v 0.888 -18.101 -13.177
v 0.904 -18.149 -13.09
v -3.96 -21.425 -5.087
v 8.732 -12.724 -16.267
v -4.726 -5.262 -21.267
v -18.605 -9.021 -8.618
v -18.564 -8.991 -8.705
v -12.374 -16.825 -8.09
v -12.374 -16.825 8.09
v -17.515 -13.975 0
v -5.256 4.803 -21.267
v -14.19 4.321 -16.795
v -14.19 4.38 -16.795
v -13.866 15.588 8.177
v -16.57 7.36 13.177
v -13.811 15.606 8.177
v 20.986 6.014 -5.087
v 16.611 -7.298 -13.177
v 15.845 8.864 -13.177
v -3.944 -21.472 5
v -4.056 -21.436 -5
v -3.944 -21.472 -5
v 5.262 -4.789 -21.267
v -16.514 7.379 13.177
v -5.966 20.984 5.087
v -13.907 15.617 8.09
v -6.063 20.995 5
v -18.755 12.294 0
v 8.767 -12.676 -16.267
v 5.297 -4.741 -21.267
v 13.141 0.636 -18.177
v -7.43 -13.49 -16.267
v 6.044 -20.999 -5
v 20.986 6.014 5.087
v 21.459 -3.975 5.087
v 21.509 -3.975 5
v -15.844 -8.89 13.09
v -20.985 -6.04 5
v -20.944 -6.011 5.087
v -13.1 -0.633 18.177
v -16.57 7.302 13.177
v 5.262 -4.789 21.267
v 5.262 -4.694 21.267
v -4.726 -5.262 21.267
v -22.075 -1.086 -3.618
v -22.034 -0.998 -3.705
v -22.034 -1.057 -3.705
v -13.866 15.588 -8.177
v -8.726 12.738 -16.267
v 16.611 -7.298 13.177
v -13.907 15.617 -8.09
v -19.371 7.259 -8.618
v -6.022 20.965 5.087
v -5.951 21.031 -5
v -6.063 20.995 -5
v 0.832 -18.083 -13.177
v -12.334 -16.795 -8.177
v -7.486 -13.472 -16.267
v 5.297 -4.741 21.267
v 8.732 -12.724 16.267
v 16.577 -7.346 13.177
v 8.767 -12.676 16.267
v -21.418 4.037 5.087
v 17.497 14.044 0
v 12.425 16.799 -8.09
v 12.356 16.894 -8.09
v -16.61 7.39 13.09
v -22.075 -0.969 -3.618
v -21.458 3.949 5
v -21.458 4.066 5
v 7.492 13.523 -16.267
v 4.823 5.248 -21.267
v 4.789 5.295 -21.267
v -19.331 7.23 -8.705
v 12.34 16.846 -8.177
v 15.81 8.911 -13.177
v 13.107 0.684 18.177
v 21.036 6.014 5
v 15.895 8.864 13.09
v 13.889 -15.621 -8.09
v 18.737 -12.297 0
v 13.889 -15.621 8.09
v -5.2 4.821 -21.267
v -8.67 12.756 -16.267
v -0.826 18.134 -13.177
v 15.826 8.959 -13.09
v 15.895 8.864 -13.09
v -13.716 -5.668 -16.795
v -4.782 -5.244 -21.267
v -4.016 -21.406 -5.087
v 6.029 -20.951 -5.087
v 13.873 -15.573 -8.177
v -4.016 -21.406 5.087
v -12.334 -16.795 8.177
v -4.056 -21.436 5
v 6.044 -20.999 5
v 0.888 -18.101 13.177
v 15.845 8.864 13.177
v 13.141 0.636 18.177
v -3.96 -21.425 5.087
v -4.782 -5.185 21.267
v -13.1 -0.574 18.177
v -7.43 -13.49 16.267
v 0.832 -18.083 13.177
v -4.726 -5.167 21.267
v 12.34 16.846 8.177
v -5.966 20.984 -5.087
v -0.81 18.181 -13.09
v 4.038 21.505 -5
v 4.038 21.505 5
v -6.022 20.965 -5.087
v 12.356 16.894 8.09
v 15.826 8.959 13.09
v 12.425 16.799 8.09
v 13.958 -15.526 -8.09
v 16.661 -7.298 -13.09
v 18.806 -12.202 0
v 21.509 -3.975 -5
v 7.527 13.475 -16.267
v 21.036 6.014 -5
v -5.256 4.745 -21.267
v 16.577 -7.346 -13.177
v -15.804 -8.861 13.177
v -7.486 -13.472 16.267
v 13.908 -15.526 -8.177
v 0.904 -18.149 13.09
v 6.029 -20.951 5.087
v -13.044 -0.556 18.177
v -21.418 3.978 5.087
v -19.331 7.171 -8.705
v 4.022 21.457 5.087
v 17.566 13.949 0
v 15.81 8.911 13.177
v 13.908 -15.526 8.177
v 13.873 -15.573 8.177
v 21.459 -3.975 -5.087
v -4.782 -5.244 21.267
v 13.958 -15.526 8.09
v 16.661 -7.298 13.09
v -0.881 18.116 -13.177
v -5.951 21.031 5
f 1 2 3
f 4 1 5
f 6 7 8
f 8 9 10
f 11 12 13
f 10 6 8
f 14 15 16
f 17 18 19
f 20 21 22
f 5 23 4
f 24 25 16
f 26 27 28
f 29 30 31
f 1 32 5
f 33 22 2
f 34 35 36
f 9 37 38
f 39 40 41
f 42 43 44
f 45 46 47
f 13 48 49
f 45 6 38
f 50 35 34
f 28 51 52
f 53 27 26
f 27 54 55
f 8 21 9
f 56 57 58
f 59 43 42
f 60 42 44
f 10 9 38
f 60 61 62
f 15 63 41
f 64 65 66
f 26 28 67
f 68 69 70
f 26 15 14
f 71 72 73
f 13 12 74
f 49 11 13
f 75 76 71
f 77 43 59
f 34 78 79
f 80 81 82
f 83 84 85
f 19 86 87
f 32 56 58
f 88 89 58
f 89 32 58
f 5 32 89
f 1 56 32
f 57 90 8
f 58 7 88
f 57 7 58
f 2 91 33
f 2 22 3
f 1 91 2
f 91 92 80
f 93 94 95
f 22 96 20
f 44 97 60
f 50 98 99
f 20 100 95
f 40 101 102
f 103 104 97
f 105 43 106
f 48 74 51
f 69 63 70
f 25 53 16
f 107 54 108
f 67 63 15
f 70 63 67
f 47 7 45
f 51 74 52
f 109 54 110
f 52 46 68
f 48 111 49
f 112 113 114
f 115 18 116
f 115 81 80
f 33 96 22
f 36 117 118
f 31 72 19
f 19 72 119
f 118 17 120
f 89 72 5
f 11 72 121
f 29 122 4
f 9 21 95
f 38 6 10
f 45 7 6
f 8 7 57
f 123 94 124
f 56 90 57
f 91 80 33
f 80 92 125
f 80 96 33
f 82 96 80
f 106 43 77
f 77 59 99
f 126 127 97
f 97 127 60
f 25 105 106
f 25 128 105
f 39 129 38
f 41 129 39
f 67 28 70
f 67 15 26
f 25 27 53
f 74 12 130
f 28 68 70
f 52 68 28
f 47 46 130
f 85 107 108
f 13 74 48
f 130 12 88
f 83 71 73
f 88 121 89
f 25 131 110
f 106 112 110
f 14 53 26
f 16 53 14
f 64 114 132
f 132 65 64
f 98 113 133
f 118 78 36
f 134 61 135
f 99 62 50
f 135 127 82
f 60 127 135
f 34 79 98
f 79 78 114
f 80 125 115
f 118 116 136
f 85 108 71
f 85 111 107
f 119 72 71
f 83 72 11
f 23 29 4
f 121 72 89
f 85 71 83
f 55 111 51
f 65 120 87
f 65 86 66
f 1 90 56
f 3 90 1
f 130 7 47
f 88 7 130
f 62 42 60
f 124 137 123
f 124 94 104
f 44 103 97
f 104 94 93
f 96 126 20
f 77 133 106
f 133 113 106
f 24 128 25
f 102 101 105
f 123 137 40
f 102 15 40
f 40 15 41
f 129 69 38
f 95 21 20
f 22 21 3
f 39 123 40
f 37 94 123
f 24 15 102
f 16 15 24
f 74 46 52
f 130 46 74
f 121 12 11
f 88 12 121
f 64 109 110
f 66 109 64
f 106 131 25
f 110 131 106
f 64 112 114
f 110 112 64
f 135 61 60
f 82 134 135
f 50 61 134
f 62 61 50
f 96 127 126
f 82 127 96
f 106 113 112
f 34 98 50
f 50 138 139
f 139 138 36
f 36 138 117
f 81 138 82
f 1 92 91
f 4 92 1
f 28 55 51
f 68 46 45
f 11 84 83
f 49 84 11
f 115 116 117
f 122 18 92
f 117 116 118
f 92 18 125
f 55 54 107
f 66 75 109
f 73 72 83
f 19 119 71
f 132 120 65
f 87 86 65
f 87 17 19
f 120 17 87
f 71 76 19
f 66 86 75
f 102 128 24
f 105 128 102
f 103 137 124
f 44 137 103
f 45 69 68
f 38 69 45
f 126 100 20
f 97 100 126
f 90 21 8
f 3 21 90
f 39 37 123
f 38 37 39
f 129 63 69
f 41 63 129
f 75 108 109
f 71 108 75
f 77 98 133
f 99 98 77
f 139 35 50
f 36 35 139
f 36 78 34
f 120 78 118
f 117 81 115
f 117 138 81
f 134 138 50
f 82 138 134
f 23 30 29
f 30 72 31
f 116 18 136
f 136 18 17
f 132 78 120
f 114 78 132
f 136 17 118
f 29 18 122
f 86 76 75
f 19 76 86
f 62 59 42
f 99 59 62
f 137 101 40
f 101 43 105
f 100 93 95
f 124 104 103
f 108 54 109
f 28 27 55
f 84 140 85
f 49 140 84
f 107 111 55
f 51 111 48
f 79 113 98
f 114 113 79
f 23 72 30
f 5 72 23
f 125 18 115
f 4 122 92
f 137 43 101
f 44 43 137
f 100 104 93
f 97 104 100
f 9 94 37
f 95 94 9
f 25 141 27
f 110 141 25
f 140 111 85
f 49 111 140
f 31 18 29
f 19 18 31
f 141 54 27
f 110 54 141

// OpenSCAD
// Auto-generated OpenSCAD file

    inner_points = 10*[[-1.652954838618672, 0.7331031267239583, 1.309016994374885], [1.8705714695316353, -1.2202296084263586, 9.520162436160717e-14], [-2.1377569026756937, 0.40075020963339975, 0.49999999999995376], [1.3857694054746135, -1.5525825255169172, -0.8090169943748362], [-1.3826041813849252, 1.5558488481550894, 0.8090169943748362], [2.140922126765382, -0.3974838869952276, -0.49999999999995376], [-1.867406245441947, 1.2234959310645308, -9.520162436160717e-14], [1.6561200627083603, -0.7298368040857861, -1.309016994374885], [-0.7445241014447653, -1.3442341281397892, 1.618033988749972], [0.08726762778757838, -1.8053534363108568, 1.3090169943750618], [-1.2293261655017869, -1.6765870452303477, 0.8090169943750405], [-0.3975344362694432, -2.1377063534014153, 0.5000000000001303], [0.4006996603591313, 2.1409726760395875, -0.5000000000001303], [1.232491389591475, 1.67985336786852, -0.8090169943750405], [-0.08410240369789032, 1.808619758949029, -1.3090169943750618], [0.7476893255344533, 1.3475004507779613, -1.618033988749972], [1.3091303975330184, 0.0636354211759657, 1.8090169943749566], [-2.199388481084053, -0.10273410018217301, -0.36180339887500484], [-0.7445241014447332, -1.3442341281399923, -1.6180339887498179], [1.579481054766765, 0.8863811426070967, 1.3090169943749077], [-1.929037823850306, 0.7200116212489581, -0.8618033988750537], [-0.47417344421098645, -0.5214884067088612, -2.118033988749867], [2.140922126765372, -0.3974838869951649, 0.5000000000000463], [-1.3675967518516992, -0.5638534083533033, -1.670820393249915], [0.8716938452479853, -1.2675951201984228, -1.6180339887498065], [-1.5763158306771028, -0.8831148199687601, 1.3090169943749874], [0.6013431880142225, -2.0903408416294527, 0.5000000000001372], [-0.5981779639245345, 2.093607164267625, -0.5000000000001372], [1.579481054766791, 0.8863811426069322, -1.3090169943749874], [0.5247041800726373, -0.4741228949366325, 2.11803398874993], [-1.2293261655017709, -1.6765870452304492, -0.8090169943748543], [1.232491389591459, 1.6798533678686214, 0.8090169943748543], [-0.5215389559829493, 0.4773892175748047, -2.11803398874993], [-1.305965173443366, -0.060369098537566515, 1.8090169943749381], [1.3857694054745975, -1.5525825255168155, 0.8090169943750587], [-2.090391390903731, -0.5981274146502662, 0.5000000000000169], [0.6013431880142324, -2.0903408416295153, -0.49999999999986267], [-0.5981779639245444, 2.0936071642676874, 0.49999999999986267], [2.0935566149934193, 0.6013937372884384, -0.5000000000000169], [-1.3826041813849093, 1.5558488481549877, -0.8090169943750587], [1.3091303975330542, 0.06363542117573866, -1.8090169943749381], [-0.4741734442110284, -0.5214884067085954, 2.1180339887499233], [0.8716938452479531, -1.26759512019822, 1.6180339887499833], [-1.743401725728415, -1.3915996399118535, 7.027711745877241e-14], [-0.39753443626943324, -2.137706353401478, -0.49999999999986966], [0.40069966035912136, 2.14097267603965, 0.49999999999986966], [1.7465669498181031, 1.3948659625500257, -7.027711745877241e-14], [-0.8685286211582651, 1.2708614428363922, -1.6180339887499833], [0.47733866830071653, 0.5247547293467676, -2.1180339887499233], [1.6561200627083341, -0.7298368040856218, 1.3090169943750098], [-1.8523988159087368, -0.8962063254437607, -0.8618033988749515], [0.08726762778760436, -1.8053534363110213, -1.3090169943748333], [2.093556614993409, 0.601393737288501, 0.4999999999999831], [-1.4149622636236618, 0.43502421593036245, -1.6708203932499783], [0.5247041800726793, -0.47412289493689824, -2.11803398874986]];

    outer_points = 10*[[0.4513288900262728, -0.2057852874430356, 2.1771593019343873], [-1.302649108448602, -0.7848281063879728, -1.6349978963843712], [0.3941935542206573, 0.7848281063879728, 2.052979362471562], [-1.3597844442542175, 0.2057852874430356, -1.7591778358471963], [1.3597844442542175, -0.2057852874430356, 1.7591778358471963], [-0.3941935542206573, -0.7848281063879728, -2.052979362471562], [1.302649108448602, 0.7848281063879728, 1.6349978963843712], [-0.4513288900262728, 0.2057852874430356, -2.1771593019343873], [-1.688543053881056, -0.4269599633384501, 1.3973530414307818], [-2.102601092560149, -0.5636534304925583, 0.4974248017124077], [-1.7456783896866714, 0.5636534304925583, 1.273173101967957], [-2.1597364283657643, 0.4269599633384501, 0.373244862249583], [2.1597364283657643, -0.4269599633384501, -0.373244862249583], [1.7456783896866714, -0.5636534304925583, -1.273173101967957], [2.102601092560149, 0.5636534304925583, -0.4974248017124077], [1.688543053881056, 0.4269599633384501, -1.3973530414307818], [-0.5402422132585865, -2.1664995714220154, 0.022043945687575728], [0.15791777208586583, 1.609728484671791, 1.5394493042628863], [-0.7822713796484513, 2.029806104267907, -0.5039907193187587], [0.3682133409693583, -2.1664995714220154, -0.3959375203996154], [1.0663733263138107, 1.609728484671791, 1.121467838175695], [0.1261841745794935, 2.029806104267907, -0.9219721854059499], [-0.6742469030791683, -1.544010572482048, -1.4654318282511805], [0.02391308226528406, 2.232217483611758, 0.051973530324130296], [-0.8238291541769085, 1.0494489622784173, -1.79053913048576], [-1.1014025269441718, 0.17893407152476137, 1.9341569349947676], [-2.185420545521156, -0.17893407152476137, -0.4218857840237987], [2.185420545521156, 0.17893407152476137, 0.4218857840237987], [1.1014025269441718, -0.17893407152476137, -1.9341569349947676], [-1.0858249656670136, -1.792036464295737, 0.7717884632905911], [-1.292542552570369, 1.792036464295737, 0.32250122159318684], [1.292542552570369, -1.792036464295737, -0.32250122159318684], [1.0858249656670136, 1.792036464295737, -0.7717884632905911], [-0.47300032157473804, -0.5802483945693141, 2.103723003127959], [-1.81292028137052, -1.0225977463601432, -0.8085059554724263], [-0.5654472368668626, 1.0225977463601432, 1.9027956403562043], [-1.9053671966626446, 0.5802483945693141, -1.0094333182441808], [1.9053671966626446, -0.5802483945693141, 1.0094333182441808], [0.5654472368668626, -1.0225977463601432, -1.9027956403562043], [1.81292028137052, 1.0225977463601432, 0.8085059554724263], [0.47300032157473804, 0.5802483945693141, -2.103723003127959], [-1.0601408485116224, -1.1861424294325253, 1.566919109563973], [-1.7301008284095134, -1.40731710532794, 0.11080463026378029], [-1.2097230996093626, 1.40731710532794, 1.2418118073293933], [-1.8796830795072537, 1.1861424294325253, -0.21430267197079933], [1.8796830795072537, -1.1861424294325253, 0.21430267197079933], [1.2097230996093626, -1.40731710532794, -1.2418118073293933], [1.7301008284095134, 1.40731710532794, -0.11080463026378029], [1.0601408485116224, 1.1861424294325253, -1.566919109563973], [-1.1845180760010863, -1.7817802124542186, -0.638939887339235], [-0.4863580906566339, 1.994447843639588, 0.8784654712360758], [-1.3694119065853356, 1.4239120694046958, -1.0407946128827448], [0.28539388800835175, -1.7817802124542186, -1.3152481061358219], [0.9835538733528042, 1.994447843639588, 0.202157252439489], [0.1005000574241024, 1.4239120694046958, -1.7171028316793315]];

    // Convex hull for inner set (I)
    module inner_hull() {
        hull() {
            for (p = inner_points) {
                translate(p) sphere(r=0.1);
            }
        }
    }

    // Convex hull for outer set (O) minus inner hull (O \ I)
    module outer_minus_inner() {
        difference() {
            hull() {
                for (p = outer_points) {
                    translate(p) sphere(r=0.1);
                }
            }
            inner_hull(); // Subtract inner hull
        }
    }

    // Convex hull for outer set (O) minus all translated inner hulls
    module outer_minus_AllTranslationInner() {
        difference() {
            hull() {
                for (p = outer_points) {
                    translate(p) sphere(r=0.1);
                }
            }
            hull() {
                translate([0,0,50]) inner_hull();
                translate([0,0,-50]) inner_hull();
            }; // Subtract translated inner hulls
        }
    }

    // Difference between outer_minus_inner and outer_minus_AllTranslationInner
    module outer_minus_inner_diff() {
        difference() {
            // Outer minus inner
            difference() {
                hull() {
                    for (p = outer_points) {
                        translate(p) sphere(r=0.1);
                    }
                }
                inner_hull();
            }

            // Subtract Outer minus AllTranslationInner
            difference() {
                hull() {
                    for (p = outer_points) {
                        translate(p) sphere(r=0.1);
                    }
                }
                hull() {
                    translate([0,0,50]) inner_hull();
                    translate([0,0,-50]) inner_hull();
                };
            }
        }
    }

    // Rendering all with colors applied
    color([1, 0, 0, 0.5]) inner_hull(); // Transparent red
    
